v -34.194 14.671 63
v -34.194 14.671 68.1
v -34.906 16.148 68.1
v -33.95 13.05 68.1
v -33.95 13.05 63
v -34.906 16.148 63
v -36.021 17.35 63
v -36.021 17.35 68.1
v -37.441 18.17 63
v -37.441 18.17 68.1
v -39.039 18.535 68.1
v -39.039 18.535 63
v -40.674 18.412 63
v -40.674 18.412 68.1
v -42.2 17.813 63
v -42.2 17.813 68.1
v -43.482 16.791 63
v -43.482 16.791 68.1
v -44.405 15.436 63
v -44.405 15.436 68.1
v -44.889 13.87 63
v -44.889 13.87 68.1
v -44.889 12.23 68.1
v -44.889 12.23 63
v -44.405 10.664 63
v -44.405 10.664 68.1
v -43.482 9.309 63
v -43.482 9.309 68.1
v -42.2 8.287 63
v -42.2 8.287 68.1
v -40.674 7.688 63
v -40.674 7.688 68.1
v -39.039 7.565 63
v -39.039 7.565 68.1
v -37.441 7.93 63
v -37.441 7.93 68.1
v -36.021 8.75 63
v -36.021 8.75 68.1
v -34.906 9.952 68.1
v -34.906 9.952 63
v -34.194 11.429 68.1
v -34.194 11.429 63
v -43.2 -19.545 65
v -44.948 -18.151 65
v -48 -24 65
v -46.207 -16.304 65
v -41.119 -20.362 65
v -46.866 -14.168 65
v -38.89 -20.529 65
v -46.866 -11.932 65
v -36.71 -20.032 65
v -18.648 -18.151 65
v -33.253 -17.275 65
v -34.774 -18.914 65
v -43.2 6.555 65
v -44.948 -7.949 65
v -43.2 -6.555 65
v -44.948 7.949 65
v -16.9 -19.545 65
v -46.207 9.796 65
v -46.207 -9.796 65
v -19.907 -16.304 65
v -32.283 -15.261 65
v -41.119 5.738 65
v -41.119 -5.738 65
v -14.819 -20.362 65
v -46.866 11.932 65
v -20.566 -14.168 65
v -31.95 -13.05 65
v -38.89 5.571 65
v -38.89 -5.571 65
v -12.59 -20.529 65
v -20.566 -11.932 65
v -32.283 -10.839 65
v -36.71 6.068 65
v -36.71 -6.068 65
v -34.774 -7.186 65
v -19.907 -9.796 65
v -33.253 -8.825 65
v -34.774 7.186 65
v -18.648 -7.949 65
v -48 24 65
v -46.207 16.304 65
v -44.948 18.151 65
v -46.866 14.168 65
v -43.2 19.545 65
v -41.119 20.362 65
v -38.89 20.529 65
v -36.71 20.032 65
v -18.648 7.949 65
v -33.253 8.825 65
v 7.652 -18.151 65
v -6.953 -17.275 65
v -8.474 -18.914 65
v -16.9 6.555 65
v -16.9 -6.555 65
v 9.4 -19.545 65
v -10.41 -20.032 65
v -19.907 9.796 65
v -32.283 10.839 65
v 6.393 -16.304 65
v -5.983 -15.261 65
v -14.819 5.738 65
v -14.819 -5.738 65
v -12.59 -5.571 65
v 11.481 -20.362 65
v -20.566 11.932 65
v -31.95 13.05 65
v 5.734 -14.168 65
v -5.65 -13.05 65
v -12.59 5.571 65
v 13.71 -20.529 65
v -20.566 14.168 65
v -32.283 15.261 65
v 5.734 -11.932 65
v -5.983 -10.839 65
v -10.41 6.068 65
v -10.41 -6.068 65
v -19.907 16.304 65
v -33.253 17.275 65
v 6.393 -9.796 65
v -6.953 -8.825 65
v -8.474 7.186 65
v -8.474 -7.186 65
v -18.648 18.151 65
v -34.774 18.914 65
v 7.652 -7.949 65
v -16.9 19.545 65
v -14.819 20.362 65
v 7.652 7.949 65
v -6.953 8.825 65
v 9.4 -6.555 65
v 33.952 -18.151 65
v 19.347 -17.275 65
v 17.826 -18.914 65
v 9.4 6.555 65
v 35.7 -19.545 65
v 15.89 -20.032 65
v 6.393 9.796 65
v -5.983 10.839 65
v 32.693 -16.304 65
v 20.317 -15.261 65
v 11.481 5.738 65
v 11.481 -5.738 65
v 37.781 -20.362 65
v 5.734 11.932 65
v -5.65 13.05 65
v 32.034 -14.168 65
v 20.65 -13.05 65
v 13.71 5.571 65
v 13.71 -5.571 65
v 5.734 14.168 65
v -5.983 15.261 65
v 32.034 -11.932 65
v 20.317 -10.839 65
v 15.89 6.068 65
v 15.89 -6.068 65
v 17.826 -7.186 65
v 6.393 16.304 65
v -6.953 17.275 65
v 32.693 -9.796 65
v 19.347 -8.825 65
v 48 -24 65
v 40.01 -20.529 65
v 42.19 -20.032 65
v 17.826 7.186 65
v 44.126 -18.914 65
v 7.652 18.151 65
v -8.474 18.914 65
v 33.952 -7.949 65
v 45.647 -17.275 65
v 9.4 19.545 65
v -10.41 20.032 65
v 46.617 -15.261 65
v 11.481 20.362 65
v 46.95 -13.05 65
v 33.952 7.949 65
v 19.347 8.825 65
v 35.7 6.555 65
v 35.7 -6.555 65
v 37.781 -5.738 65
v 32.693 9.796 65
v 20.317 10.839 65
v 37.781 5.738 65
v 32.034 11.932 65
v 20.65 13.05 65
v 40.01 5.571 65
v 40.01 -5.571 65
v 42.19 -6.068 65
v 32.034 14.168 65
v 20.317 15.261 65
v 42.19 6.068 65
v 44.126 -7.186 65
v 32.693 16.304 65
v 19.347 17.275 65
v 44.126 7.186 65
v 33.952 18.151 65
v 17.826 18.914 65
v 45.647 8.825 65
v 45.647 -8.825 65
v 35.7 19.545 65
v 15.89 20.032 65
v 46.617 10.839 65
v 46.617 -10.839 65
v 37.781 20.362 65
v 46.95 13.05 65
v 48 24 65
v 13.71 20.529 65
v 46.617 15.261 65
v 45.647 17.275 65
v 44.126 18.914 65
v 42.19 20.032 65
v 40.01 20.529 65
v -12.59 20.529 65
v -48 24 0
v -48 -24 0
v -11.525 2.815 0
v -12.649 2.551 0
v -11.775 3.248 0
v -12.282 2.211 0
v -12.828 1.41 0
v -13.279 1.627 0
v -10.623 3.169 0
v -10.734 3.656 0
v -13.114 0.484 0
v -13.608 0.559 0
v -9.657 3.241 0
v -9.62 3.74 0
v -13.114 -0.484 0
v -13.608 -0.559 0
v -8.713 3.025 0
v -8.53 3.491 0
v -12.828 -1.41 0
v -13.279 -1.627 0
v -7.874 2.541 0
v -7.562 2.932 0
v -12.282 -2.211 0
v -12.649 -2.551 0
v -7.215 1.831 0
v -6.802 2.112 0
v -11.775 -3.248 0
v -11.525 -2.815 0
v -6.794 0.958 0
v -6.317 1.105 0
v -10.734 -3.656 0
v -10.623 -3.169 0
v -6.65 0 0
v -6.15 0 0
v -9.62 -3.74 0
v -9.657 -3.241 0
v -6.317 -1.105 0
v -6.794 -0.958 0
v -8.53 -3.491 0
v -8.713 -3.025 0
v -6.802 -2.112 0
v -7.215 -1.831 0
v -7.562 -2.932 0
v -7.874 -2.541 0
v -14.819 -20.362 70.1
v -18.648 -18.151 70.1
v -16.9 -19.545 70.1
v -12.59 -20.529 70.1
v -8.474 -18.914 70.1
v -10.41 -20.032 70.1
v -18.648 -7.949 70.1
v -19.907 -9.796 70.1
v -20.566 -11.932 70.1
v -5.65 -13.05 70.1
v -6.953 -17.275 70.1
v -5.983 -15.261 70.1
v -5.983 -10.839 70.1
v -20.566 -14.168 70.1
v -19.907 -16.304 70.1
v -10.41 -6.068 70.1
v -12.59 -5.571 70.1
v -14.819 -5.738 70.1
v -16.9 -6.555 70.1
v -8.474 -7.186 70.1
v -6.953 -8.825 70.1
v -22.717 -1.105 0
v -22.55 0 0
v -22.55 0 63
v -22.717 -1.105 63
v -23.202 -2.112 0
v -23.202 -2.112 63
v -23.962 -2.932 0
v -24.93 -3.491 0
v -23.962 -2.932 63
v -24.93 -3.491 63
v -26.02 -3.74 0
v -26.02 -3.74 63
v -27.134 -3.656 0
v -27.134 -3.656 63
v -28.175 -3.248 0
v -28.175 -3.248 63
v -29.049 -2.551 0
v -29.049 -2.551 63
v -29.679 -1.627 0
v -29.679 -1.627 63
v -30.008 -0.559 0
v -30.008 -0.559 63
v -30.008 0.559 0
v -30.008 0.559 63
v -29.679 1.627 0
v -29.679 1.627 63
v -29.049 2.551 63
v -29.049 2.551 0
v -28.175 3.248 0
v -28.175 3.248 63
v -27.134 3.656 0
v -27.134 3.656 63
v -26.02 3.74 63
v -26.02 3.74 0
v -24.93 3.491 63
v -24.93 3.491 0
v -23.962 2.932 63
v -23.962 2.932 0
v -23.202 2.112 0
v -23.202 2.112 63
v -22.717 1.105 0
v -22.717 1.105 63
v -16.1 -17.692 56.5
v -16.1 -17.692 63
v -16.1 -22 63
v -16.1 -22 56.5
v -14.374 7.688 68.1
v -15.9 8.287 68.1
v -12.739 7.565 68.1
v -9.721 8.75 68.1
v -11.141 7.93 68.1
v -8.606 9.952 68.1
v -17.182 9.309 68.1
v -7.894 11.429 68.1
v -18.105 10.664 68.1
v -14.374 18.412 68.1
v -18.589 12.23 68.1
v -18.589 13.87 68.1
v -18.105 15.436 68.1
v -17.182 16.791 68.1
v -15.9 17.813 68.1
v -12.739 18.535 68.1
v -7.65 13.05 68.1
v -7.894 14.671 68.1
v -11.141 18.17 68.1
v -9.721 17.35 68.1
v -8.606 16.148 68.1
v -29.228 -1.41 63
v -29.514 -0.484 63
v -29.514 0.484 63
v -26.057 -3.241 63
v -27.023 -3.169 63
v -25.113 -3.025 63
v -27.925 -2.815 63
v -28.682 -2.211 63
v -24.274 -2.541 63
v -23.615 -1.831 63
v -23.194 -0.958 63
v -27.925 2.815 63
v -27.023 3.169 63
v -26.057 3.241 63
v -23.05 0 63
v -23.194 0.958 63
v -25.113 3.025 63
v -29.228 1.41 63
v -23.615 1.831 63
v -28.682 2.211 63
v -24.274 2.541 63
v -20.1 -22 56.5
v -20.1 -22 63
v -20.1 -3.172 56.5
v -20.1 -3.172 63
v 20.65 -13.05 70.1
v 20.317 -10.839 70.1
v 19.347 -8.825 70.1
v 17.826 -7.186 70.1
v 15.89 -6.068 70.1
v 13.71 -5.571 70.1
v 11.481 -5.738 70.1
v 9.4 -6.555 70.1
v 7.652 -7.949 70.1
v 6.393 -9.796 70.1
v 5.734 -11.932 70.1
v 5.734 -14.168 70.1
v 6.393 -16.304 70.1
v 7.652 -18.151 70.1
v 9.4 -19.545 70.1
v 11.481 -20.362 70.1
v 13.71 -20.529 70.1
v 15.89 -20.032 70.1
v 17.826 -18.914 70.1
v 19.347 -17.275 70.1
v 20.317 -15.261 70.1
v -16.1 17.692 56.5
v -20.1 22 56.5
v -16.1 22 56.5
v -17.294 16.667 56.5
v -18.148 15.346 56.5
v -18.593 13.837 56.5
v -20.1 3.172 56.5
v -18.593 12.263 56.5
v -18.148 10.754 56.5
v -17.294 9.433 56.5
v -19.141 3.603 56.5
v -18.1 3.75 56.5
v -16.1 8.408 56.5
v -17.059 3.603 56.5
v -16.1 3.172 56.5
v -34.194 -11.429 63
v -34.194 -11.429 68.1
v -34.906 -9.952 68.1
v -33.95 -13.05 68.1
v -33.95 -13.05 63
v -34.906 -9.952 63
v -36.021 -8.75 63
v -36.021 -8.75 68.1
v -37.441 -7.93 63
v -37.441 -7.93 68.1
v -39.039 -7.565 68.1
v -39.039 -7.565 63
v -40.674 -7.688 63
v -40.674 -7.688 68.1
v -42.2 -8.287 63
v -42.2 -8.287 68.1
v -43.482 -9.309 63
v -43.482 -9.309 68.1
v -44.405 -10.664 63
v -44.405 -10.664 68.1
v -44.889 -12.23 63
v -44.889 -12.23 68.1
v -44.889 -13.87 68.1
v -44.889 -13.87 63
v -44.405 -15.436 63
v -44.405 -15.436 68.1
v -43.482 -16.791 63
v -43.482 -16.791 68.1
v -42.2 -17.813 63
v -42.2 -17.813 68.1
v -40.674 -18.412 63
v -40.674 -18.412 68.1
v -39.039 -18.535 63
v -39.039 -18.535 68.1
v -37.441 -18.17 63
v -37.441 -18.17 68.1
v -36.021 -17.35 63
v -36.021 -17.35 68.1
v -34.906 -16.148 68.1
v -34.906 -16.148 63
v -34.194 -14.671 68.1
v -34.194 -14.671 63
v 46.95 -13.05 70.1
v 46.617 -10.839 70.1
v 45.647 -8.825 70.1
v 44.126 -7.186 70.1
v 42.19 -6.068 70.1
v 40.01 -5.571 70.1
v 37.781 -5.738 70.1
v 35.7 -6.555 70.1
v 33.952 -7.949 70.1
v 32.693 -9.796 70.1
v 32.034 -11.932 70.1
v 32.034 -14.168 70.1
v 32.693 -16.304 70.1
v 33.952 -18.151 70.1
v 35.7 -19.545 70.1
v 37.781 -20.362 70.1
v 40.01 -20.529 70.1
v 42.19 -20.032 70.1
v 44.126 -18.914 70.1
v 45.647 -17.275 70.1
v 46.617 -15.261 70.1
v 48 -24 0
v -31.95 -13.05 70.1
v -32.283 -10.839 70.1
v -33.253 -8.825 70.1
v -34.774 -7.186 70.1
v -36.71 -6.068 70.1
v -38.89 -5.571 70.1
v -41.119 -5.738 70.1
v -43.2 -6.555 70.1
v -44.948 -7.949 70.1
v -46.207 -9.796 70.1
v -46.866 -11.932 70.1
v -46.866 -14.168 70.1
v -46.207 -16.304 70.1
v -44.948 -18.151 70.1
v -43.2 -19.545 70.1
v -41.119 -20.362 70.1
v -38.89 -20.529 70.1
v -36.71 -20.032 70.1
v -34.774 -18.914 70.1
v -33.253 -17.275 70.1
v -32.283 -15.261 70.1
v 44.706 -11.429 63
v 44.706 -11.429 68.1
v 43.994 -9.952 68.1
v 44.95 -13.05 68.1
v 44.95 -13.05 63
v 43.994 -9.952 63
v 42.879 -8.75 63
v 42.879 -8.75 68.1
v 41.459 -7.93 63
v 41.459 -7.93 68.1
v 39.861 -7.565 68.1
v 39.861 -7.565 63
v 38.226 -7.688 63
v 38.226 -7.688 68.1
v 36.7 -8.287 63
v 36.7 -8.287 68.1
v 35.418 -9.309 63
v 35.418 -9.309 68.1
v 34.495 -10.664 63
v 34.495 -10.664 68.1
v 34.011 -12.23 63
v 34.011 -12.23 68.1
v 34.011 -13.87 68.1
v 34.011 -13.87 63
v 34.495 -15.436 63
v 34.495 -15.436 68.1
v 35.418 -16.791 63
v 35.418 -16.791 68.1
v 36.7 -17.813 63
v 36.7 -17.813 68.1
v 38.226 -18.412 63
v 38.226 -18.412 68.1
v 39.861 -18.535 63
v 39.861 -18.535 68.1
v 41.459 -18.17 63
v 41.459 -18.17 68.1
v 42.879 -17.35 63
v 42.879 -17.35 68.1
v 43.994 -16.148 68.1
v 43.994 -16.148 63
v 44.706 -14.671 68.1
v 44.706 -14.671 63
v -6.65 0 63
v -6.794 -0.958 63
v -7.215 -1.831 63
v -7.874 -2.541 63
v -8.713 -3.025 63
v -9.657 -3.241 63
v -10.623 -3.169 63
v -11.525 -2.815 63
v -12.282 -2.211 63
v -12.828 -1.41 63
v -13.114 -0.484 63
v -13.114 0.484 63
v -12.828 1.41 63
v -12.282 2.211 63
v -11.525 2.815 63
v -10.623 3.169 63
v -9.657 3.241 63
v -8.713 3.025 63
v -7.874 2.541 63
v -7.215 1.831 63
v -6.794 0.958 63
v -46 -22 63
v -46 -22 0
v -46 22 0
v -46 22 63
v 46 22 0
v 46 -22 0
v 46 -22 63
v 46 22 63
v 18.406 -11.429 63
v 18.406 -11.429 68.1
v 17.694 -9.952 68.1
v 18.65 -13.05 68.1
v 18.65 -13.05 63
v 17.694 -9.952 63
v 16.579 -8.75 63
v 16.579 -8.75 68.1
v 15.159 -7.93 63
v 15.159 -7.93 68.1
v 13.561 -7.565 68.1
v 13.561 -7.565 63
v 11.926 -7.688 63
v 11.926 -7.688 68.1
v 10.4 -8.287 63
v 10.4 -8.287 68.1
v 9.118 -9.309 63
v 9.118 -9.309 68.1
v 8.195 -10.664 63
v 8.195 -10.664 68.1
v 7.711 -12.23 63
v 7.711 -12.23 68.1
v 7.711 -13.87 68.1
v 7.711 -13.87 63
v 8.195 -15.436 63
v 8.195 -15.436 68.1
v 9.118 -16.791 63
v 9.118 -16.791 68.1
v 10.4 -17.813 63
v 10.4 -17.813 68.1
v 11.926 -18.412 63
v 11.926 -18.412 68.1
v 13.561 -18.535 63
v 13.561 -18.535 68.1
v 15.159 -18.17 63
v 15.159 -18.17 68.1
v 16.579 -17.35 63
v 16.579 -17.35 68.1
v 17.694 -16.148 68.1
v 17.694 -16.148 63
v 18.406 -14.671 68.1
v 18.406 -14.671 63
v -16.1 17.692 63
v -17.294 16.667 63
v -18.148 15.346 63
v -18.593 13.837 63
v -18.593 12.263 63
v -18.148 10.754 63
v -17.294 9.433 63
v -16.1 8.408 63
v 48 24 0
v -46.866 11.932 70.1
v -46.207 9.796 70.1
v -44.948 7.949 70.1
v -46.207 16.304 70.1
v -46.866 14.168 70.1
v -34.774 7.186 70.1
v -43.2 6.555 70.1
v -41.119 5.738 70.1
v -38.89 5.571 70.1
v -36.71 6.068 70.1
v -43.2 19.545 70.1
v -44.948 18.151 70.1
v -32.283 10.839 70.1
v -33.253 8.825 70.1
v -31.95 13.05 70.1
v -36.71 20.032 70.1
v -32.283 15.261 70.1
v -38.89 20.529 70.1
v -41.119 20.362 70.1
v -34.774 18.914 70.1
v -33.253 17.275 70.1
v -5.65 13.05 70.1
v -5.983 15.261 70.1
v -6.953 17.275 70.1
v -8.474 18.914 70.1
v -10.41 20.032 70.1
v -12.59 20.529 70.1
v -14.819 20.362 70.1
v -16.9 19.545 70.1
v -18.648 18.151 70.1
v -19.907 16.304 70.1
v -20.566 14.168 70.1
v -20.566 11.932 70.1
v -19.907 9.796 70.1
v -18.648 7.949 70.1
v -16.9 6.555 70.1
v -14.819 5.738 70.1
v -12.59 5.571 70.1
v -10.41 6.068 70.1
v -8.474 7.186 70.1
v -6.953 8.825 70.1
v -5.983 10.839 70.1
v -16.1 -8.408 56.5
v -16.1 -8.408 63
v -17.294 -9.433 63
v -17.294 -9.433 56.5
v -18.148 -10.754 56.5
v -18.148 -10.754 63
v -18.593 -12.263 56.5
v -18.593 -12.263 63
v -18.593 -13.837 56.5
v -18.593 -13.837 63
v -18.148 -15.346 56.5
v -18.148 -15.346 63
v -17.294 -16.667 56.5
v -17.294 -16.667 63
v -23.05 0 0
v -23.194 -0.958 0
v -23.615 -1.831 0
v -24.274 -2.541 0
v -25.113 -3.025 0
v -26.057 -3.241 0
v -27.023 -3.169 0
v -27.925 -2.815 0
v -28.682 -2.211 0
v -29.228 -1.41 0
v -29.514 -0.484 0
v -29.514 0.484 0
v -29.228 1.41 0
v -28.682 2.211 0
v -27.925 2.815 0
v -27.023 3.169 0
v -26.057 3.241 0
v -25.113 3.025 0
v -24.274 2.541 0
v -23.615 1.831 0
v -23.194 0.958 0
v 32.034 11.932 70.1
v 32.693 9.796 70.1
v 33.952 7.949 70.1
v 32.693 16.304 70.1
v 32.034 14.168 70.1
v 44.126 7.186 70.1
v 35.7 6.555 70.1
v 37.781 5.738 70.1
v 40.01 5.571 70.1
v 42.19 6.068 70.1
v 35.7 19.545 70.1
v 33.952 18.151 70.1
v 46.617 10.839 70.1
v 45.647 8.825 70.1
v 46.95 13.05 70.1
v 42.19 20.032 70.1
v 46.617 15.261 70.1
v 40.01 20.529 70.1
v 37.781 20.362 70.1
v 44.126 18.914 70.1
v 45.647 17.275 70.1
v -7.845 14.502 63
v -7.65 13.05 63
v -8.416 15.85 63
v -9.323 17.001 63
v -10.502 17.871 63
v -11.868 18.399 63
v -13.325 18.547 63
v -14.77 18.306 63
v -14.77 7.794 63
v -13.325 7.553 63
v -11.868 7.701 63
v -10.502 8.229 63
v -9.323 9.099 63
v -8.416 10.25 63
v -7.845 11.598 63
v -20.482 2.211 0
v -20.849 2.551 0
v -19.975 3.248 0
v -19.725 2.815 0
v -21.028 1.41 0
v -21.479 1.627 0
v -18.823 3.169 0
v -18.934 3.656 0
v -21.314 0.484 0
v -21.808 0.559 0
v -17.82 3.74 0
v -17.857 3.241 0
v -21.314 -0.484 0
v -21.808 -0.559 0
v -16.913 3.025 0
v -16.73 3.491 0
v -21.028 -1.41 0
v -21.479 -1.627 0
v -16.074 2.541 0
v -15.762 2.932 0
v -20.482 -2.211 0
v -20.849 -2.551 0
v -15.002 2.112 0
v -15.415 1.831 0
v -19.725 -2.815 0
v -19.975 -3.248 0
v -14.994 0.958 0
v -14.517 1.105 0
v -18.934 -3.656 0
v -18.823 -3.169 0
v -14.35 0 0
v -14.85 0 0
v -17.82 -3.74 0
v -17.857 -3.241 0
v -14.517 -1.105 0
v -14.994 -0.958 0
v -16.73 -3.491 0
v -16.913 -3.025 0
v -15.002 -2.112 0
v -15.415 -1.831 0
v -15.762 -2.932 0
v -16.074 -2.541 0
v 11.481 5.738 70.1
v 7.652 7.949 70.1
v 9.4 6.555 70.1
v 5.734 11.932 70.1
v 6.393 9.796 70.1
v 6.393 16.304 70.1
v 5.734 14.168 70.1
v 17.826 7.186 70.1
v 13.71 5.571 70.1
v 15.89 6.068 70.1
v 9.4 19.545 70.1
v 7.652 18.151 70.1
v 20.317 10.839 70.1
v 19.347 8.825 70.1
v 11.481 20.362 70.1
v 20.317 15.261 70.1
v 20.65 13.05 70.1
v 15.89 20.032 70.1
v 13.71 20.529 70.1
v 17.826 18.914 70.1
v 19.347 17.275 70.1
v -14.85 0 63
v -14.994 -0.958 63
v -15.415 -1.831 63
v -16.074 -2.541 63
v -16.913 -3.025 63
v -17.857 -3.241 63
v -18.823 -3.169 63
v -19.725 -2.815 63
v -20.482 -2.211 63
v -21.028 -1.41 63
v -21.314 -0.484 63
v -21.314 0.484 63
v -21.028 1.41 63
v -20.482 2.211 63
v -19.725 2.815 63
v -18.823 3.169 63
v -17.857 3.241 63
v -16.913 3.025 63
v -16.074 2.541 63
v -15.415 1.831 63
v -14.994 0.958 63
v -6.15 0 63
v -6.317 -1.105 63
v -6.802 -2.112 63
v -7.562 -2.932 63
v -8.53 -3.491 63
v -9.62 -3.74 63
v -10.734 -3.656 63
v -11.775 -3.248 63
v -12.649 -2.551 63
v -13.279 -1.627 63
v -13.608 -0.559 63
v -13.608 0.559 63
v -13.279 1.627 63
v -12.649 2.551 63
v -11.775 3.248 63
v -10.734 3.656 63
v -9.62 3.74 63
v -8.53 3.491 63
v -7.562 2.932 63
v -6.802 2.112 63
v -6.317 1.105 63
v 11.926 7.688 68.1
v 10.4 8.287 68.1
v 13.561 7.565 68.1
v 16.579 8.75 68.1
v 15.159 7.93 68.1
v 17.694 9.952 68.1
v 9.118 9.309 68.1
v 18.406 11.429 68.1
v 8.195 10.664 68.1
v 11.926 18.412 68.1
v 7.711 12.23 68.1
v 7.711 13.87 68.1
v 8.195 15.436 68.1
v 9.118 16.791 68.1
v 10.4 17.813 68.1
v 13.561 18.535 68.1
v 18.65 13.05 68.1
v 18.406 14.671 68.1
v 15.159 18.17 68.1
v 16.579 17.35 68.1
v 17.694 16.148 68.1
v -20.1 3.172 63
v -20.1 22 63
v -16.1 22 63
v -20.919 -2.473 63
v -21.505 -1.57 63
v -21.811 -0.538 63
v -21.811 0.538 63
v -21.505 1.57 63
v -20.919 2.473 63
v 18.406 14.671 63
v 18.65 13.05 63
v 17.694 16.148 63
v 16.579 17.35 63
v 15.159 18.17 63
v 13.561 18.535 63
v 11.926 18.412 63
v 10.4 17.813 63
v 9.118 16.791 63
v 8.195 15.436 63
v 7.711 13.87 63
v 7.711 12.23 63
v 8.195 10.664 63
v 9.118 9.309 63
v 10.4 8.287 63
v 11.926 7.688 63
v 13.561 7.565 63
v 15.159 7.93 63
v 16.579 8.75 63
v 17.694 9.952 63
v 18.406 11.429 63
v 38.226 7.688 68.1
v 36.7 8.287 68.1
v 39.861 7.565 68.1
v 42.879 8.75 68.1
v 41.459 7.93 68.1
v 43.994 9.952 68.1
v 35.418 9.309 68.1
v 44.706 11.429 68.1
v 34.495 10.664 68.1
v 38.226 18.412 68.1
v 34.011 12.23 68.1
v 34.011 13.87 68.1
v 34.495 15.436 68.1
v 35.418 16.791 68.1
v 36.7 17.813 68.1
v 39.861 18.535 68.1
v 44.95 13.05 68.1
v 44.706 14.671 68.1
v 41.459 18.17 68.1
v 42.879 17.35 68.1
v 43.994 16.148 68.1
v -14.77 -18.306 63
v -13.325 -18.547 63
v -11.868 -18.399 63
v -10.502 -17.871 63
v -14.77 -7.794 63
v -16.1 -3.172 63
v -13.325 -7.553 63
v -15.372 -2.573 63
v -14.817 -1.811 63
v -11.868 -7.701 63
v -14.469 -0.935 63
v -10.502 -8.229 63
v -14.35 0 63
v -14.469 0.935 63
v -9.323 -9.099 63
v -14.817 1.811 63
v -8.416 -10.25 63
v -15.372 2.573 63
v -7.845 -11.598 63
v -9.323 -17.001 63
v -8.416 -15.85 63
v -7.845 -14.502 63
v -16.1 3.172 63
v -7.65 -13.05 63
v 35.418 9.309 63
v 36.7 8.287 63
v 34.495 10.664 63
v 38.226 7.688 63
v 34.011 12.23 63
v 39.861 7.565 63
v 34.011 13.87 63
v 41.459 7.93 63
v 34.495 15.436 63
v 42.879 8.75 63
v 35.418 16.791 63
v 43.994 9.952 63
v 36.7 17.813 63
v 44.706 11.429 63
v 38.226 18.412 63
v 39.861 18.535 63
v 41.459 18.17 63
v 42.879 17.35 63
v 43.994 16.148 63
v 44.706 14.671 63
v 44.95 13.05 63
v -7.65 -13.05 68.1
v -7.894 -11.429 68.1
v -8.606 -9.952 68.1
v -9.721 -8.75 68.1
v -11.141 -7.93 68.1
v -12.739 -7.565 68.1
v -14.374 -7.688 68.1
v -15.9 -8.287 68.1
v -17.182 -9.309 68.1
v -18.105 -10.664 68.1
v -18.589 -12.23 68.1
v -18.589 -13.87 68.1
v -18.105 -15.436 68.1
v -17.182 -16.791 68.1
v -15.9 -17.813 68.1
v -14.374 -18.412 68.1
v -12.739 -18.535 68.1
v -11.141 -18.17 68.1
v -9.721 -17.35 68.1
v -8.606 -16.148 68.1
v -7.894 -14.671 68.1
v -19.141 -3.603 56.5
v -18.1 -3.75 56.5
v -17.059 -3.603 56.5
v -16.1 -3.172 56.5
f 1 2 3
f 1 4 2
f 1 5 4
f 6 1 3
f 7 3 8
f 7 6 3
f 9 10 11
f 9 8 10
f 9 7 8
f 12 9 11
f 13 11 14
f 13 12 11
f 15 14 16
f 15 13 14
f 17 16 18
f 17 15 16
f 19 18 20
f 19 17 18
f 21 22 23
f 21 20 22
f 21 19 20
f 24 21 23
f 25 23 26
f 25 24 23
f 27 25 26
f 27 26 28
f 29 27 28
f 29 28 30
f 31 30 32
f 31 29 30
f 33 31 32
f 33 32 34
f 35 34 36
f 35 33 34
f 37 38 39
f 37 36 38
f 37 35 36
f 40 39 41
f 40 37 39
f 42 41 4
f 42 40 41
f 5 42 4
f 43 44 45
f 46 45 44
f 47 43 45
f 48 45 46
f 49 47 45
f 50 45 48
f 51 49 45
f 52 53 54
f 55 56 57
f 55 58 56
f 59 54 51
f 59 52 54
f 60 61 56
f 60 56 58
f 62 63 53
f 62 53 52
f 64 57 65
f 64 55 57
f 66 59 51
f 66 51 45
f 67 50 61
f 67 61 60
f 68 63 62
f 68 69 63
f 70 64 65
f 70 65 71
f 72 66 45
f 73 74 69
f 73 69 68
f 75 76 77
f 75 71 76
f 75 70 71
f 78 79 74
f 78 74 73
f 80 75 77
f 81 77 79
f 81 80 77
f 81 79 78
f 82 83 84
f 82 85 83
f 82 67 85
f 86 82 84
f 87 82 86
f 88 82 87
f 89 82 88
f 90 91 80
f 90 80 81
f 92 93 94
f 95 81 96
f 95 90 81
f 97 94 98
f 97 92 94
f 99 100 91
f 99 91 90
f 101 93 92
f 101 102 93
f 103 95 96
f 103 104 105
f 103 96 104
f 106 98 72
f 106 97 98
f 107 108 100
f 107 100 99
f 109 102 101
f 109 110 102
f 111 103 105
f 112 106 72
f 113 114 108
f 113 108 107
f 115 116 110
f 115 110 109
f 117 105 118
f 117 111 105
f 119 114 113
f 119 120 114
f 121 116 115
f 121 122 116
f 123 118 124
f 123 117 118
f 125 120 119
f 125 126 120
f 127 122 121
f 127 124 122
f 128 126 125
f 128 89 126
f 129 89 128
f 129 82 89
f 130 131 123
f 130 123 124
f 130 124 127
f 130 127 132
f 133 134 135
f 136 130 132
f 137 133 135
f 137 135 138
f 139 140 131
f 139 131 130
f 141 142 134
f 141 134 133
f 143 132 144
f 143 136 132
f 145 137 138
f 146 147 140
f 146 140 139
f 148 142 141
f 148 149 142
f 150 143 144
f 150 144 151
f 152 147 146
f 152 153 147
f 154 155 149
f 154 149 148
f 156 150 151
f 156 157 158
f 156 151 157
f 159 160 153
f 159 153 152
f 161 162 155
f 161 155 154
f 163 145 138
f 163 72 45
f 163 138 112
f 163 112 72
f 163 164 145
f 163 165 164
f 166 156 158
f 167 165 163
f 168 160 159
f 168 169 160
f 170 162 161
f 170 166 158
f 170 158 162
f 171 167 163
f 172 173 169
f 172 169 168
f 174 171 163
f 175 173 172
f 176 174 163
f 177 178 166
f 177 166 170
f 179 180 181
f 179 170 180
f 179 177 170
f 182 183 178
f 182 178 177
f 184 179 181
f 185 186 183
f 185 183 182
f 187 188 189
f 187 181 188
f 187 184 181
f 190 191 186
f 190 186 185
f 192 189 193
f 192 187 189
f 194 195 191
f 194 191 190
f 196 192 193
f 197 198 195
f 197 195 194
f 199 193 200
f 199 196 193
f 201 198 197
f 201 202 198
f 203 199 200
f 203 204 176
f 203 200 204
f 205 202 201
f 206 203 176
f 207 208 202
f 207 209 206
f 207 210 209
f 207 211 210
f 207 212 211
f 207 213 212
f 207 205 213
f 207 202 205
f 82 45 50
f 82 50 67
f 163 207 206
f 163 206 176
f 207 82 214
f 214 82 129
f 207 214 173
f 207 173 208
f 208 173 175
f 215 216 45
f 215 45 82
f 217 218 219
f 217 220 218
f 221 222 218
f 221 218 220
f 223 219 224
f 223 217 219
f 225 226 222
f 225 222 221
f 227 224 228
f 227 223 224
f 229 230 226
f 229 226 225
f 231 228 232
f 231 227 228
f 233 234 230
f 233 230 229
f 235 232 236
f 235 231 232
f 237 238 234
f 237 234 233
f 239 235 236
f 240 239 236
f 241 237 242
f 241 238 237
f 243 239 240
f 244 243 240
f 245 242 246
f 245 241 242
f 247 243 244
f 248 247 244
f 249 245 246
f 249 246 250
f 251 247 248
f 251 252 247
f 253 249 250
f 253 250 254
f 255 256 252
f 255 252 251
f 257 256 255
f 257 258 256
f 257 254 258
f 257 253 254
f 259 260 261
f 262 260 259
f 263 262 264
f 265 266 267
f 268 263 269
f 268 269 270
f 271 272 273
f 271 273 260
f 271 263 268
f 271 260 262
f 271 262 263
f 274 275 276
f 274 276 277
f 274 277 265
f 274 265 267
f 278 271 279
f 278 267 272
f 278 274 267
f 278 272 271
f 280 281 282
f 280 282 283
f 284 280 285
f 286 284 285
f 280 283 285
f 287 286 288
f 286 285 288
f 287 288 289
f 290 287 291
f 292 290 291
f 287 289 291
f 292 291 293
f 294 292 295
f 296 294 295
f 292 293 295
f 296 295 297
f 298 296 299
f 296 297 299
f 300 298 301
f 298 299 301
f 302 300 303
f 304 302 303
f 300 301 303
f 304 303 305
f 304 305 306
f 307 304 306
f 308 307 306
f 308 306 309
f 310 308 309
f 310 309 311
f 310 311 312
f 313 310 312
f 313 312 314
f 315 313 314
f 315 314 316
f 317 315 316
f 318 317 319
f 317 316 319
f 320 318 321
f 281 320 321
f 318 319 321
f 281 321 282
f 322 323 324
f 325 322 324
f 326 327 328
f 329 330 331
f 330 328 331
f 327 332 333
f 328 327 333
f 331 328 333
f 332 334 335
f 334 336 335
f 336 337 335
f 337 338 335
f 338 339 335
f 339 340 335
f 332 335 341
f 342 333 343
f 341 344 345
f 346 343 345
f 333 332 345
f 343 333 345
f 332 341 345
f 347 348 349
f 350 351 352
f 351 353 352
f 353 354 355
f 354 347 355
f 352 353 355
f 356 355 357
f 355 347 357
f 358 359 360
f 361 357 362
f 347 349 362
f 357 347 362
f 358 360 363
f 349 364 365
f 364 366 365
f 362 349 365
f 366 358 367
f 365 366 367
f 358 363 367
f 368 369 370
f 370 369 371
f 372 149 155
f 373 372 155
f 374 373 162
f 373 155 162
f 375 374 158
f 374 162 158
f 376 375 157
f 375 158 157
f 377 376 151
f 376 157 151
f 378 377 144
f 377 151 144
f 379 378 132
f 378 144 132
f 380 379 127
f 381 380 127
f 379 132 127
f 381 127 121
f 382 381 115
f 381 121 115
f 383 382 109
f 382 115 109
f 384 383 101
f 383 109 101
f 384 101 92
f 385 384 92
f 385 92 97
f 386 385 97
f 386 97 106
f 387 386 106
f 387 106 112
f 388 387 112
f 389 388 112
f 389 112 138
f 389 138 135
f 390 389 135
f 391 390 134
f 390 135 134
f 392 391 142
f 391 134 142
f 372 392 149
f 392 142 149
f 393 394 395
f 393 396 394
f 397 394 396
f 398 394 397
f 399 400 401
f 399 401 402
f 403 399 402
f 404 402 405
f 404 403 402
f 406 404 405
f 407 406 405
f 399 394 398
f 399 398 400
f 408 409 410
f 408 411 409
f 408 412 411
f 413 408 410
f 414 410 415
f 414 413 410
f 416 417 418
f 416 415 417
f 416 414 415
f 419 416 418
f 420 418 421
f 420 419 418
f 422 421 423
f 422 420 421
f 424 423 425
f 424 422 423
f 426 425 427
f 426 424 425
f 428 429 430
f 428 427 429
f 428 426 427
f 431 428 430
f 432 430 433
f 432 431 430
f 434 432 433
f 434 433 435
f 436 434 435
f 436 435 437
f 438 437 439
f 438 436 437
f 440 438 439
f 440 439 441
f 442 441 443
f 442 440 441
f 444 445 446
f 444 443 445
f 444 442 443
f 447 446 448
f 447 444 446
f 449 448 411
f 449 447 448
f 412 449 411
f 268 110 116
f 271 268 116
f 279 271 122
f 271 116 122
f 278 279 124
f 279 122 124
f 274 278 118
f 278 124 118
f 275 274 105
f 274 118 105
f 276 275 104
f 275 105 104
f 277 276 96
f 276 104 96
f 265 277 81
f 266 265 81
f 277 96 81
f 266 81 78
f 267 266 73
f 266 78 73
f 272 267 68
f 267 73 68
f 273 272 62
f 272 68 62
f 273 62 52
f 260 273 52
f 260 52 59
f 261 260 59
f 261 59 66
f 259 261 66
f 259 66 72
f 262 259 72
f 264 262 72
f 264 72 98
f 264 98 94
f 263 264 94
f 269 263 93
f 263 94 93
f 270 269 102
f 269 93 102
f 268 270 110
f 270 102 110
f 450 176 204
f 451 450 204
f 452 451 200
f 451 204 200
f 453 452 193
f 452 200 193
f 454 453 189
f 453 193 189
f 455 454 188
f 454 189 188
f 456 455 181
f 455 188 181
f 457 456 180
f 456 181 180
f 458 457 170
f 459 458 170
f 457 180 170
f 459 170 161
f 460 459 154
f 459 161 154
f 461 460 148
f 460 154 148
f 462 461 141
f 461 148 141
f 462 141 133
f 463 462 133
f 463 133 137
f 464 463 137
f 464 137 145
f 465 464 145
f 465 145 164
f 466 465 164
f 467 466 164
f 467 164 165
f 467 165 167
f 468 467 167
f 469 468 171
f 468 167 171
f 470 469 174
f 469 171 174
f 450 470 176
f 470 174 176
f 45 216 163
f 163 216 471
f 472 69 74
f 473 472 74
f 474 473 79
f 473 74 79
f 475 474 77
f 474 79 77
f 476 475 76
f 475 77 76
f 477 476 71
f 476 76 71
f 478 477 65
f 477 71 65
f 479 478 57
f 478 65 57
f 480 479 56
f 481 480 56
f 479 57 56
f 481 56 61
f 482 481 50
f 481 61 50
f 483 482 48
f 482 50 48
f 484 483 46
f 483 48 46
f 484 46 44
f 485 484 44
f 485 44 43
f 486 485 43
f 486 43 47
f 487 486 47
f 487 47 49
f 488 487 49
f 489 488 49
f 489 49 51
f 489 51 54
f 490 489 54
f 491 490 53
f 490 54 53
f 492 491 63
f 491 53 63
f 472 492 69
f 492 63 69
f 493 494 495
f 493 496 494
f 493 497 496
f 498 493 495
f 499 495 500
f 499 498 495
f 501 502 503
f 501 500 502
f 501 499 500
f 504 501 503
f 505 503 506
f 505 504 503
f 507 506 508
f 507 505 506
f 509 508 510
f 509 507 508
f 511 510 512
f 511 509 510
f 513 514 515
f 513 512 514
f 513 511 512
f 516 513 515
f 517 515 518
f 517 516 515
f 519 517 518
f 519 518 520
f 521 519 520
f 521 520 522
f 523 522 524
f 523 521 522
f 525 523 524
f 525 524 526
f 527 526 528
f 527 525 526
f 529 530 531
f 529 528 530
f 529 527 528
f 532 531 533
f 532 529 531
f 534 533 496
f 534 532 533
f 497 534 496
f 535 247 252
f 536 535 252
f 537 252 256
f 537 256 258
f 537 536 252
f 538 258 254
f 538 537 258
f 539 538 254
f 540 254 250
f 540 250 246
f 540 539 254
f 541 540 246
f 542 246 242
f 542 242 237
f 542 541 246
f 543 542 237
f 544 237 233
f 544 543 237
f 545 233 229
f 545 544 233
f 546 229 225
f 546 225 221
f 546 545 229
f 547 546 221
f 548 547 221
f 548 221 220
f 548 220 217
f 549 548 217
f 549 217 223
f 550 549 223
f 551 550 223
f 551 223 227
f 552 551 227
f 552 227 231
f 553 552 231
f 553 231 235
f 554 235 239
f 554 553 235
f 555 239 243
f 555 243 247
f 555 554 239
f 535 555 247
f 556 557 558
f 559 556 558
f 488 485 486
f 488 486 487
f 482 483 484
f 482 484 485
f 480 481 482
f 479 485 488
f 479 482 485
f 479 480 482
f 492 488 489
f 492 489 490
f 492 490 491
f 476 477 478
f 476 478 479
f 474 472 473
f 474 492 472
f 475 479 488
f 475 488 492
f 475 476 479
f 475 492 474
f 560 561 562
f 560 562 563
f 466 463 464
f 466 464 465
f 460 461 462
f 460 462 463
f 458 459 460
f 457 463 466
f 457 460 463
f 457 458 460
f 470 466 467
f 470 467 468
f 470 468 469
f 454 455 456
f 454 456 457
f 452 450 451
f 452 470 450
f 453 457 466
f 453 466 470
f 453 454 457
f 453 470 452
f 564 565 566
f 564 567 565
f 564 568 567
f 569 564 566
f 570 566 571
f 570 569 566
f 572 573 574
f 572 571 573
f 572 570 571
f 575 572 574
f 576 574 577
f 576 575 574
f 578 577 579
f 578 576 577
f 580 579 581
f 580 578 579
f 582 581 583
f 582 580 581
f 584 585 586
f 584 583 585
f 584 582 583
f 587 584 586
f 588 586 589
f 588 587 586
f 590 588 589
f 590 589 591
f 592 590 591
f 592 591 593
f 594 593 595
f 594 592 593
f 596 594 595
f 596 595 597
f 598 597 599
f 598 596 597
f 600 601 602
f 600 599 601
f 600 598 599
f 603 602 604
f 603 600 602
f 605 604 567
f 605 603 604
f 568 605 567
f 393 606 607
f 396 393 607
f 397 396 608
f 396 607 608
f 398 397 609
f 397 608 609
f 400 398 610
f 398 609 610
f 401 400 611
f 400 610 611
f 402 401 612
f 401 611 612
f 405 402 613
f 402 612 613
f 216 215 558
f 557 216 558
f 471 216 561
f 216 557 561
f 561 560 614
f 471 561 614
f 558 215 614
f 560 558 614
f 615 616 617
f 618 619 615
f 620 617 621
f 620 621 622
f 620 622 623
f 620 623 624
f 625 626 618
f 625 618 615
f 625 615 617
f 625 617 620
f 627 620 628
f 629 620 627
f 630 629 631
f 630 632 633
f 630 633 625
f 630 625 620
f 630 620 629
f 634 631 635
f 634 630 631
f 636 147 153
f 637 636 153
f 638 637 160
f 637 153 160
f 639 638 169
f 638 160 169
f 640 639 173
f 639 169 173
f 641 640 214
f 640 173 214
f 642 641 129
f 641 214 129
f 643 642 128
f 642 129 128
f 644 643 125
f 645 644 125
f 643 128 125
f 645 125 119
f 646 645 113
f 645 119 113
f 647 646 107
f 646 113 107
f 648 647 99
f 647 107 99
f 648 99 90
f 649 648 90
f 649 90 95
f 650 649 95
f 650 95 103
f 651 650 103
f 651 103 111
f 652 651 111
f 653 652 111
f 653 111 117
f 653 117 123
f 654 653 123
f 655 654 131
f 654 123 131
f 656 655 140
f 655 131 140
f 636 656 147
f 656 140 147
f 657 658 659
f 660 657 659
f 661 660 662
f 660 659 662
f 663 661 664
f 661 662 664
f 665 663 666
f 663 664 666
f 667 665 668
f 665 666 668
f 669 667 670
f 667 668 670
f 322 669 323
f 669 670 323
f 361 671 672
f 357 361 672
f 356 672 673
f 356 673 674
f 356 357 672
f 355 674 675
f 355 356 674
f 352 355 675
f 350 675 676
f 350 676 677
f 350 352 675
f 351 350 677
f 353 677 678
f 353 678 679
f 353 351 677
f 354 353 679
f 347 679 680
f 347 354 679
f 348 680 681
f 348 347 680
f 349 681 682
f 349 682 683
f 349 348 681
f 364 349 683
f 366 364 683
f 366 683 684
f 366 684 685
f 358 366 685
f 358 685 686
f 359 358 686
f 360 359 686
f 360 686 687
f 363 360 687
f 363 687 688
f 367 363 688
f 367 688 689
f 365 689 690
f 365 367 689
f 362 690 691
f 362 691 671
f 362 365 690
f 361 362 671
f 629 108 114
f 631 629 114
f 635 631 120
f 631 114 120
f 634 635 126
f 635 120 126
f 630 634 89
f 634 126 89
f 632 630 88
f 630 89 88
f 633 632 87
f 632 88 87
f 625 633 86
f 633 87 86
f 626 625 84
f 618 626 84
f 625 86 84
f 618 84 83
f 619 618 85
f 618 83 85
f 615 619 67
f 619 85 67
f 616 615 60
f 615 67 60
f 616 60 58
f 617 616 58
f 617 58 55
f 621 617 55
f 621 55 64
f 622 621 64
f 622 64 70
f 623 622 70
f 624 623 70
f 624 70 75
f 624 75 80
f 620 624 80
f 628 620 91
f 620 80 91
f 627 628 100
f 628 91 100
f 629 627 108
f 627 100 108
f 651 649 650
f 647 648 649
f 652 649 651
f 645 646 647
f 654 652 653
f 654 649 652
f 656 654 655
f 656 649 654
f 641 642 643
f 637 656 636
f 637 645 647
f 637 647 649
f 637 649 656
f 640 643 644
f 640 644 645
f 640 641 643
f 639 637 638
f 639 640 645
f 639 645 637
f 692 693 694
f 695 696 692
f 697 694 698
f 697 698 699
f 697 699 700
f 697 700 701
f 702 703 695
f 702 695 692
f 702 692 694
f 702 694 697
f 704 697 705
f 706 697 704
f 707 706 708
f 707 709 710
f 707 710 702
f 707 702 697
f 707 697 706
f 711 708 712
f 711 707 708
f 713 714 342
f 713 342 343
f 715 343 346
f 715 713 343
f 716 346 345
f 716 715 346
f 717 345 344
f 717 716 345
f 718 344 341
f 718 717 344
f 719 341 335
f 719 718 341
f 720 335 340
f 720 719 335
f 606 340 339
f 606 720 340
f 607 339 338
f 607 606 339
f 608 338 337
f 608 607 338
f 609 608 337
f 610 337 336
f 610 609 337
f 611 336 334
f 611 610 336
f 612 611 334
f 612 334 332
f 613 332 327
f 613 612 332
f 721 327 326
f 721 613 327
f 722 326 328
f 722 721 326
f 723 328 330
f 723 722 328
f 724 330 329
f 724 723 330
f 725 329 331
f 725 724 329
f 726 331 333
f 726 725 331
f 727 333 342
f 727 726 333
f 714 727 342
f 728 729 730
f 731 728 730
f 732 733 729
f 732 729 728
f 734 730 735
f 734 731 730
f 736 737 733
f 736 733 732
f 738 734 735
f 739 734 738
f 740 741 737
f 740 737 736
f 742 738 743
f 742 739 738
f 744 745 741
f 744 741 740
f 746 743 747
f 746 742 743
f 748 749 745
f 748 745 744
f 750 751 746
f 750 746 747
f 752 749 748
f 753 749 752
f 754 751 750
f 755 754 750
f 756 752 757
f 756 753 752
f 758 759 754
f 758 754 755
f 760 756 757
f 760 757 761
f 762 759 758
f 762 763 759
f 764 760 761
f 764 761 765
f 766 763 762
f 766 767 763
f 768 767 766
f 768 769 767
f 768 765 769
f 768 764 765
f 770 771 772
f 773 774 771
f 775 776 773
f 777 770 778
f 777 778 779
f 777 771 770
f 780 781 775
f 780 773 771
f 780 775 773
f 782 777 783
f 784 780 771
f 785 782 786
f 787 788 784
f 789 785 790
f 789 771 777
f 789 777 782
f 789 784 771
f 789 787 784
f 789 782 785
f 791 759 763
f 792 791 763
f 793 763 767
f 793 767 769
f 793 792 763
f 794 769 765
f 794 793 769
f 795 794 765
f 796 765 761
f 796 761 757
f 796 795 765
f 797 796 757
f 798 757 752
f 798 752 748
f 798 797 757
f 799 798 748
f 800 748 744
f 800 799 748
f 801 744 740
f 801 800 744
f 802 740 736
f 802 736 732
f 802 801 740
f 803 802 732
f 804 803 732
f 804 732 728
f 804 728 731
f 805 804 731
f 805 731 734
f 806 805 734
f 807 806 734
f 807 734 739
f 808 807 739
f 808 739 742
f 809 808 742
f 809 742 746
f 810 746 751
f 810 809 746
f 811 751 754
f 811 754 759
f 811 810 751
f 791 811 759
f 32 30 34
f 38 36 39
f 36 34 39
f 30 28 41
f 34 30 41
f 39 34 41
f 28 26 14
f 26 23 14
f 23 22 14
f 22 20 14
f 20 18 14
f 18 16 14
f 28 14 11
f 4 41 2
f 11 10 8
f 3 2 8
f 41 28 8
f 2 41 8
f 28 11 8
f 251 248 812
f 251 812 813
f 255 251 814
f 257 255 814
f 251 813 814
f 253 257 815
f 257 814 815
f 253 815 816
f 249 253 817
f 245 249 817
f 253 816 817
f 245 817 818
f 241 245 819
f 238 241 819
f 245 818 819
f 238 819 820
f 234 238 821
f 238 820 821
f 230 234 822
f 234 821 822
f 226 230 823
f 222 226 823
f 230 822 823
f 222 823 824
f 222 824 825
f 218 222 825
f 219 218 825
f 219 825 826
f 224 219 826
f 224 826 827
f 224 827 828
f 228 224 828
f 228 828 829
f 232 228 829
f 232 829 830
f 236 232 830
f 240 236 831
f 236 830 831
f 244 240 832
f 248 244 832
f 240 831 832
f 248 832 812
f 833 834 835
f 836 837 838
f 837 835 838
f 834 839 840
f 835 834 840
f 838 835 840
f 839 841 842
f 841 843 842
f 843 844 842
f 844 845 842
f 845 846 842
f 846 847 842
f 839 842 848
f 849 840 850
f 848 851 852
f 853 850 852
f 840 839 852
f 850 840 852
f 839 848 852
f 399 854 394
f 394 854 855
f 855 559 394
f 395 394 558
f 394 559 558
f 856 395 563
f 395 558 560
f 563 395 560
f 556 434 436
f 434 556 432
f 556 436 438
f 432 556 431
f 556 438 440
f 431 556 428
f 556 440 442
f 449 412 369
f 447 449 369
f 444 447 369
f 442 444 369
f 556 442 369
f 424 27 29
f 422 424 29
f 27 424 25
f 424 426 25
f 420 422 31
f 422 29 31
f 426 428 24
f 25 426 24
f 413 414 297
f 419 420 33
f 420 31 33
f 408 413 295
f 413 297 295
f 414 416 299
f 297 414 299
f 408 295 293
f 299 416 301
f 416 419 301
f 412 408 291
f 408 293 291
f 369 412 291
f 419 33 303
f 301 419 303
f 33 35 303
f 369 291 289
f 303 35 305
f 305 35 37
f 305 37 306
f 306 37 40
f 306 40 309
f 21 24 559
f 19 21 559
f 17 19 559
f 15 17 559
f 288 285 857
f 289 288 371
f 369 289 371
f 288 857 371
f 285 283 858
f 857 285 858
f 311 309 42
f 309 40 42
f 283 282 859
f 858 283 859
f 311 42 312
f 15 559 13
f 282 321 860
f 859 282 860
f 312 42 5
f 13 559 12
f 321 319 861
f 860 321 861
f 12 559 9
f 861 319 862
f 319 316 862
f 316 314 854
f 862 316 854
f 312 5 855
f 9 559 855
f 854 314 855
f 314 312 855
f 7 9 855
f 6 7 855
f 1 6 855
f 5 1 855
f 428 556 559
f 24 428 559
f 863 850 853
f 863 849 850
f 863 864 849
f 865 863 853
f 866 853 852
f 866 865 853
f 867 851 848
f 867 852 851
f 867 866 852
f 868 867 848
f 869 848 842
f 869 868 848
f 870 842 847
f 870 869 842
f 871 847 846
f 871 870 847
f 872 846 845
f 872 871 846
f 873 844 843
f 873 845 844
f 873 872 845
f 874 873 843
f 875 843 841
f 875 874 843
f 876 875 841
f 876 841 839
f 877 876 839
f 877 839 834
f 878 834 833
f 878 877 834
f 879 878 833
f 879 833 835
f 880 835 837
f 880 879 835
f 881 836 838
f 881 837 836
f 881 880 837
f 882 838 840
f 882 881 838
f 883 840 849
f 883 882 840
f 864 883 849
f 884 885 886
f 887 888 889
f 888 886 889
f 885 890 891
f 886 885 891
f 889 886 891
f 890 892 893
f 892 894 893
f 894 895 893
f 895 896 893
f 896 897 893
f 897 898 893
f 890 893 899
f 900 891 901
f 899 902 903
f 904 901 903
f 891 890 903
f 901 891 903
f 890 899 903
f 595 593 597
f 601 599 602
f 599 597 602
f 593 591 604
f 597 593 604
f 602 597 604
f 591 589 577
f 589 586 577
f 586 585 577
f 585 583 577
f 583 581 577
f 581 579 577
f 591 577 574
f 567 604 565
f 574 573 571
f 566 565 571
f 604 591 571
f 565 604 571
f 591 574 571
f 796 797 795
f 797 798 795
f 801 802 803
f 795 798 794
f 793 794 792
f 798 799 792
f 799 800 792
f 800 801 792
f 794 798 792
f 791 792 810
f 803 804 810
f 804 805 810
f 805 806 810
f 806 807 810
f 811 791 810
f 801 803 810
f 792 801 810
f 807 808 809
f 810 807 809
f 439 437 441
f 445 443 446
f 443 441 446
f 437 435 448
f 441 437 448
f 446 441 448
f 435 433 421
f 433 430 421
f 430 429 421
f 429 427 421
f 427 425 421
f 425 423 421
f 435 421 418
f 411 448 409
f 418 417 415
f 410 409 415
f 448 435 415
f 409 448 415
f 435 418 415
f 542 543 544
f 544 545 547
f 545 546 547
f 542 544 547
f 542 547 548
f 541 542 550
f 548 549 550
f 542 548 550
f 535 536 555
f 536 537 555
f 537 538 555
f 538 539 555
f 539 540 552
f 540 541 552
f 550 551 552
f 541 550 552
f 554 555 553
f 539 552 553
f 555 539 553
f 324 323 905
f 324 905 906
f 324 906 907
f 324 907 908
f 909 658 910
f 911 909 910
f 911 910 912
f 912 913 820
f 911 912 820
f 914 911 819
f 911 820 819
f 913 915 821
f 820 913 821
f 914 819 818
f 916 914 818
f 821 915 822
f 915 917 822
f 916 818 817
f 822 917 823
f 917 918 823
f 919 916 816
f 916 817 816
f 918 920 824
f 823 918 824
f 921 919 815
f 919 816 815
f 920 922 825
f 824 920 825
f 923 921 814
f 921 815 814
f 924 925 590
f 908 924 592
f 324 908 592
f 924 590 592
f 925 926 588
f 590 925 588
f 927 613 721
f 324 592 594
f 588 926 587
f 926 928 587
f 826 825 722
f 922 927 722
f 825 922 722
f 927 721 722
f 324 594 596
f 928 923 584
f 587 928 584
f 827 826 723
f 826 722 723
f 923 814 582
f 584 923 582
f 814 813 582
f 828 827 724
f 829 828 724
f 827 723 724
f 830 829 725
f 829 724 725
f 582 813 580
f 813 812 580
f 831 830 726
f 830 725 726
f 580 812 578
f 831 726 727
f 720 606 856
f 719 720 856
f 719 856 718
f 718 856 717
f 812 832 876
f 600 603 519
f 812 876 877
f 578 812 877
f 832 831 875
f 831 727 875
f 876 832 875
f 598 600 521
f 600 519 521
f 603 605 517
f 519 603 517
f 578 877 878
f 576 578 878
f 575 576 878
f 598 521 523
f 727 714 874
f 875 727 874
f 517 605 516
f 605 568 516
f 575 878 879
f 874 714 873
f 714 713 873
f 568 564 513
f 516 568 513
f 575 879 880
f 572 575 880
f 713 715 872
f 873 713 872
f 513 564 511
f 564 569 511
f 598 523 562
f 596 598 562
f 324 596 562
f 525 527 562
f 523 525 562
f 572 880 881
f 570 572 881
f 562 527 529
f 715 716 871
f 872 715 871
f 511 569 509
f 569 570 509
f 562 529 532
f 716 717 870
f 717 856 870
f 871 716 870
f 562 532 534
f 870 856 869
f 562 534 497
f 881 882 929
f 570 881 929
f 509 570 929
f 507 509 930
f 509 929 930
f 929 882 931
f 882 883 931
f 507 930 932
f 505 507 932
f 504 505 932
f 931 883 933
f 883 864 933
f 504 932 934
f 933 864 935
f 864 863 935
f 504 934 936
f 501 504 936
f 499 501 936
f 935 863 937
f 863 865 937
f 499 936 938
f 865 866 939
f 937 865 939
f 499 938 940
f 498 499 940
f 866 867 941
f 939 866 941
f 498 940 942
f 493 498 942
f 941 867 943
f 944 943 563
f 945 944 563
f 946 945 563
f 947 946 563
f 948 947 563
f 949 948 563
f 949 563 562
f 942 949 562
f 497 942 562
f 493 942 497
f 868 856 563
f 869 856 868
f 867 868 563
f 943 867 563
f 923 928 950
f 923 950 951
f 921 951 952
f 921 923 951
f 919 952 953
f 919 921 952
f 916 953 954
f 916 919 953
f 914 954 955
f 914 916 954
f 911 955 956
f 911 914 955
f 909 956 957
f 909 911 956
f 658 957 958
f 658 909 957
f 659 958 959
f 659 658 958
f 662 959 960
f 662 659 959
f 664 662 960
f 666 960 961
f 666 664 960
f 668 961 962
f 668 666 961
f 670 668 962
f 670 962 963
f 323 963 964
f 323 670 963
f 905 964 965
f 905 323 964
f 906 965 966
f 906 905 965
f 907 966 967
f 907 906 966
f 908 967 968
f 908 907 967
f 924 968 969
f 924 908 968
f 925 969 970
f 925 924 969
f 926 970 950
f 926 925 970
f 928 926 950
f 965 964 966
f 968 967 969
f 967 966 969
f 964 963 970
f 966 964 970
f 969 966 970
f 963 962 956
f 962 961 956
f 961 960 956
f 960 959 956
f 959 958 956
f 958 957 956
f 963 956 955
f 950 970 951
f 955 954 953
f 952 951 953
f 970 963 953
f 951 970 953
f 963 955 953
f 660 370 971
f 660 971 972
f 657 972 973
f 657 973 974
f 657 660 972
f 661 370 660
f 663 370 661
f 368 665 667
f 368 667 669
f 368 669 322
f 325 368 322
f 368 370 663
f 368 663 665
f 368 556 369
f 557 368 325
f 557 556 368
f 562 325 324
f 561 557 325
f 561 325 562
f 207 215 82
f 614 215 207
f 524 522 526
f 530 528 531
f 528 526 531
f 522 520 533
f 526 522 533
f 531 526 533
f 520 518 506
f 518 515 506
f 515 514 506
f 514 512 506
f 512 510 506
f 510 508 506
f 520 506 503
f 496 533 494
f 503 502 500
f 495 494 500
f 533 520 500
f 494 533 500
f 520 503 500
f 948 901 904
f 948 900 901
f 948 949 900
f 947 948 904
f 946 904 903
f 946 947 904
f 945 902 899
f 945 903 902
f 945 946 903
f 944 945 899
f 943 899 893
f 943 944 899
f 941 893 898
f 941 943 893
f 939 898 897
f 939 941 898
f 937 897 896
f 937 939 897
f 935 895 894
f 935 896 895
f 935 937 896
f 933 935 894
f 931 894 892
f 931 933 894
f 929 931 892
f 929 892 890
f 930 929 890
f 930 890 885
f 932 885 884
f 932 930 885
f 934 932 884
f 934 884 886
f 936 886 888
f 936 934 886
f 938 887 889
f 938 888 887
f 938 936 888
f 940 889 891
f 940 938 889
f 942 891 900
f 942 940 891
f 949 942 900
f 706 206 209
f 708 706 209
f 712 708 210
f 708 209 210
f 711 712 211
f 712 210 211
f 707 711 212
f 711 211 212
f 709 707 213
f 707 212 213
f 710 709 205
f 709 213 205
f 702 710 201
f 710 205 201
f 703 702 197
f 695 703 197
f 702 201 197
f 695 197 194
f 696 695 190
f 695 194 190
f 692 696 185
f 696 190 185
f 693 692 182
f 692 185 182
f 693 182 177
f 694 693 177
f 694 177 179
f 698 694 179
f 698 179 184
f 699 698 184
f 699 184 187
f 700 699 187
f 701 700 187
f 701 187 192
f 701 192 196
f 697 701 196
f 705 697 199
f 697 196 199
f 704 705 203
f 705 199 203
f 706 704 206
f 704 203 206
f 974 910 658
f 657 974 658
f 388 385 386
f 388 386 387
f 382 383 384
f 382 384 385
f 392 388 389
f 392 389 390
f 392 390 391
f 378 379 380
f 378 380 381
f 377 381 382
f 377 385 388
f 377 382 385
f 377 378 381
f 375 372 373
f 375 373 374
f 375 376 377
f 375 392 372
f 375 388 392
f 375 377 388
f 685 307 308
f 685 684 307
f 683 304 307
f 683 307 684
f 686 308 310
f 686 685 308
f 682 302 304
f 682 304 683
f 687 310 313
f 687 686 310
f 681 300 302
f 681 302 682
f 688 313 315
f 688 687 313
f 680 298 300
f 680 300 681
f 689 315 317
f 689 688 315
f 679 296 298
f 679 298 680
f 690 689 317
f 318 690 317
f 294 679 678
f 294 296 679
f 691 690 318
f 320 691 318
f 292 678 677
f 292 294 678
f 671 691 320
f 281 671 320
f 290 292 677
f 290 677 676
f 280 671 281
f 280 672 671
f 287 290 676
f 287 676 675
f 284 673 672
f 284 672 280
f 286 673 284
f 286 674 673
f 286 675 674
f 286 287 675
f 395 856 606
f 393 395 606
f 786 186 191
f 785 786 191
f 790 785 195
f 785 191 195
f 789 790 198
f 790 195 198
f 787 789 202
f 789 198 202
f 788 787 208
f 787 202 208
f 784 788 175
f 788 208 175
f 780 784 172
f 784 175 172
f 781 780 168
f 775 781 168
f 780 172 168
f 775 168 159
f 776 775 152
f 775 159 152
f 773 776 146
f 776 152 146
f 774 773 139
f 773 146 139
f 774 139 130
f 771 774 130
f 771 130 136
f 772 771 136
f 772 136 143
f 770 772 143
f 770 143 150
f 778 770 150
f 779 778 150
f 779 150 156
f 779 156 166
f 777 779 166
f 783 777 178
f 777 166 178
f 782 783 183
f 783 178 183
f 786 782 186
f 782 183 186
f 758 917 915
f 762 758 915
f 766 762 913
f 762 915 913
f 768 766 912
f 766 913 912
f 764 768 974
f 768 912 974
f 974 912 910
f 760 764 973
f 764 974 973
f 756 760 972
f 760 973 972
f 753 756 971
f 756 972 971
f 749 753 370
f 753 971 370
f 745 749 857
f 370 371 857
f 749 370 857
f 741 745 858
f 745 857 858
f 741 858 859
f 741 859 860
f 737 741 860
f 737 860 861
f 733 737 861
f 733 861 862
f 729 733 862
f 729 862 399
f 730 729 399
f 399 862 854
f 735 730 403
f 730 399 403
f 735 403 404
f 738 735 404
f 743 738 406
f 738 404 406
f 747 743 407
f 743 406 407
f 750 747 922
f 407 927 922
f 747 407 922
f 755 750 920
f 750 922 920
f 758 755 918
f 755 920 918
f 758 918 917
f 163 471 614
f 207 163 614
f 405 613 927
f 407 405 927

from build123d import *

# Parameters (mm, degrees)
F0_W     = 96
F0_H     = 48
F1_DEPTH = 65
F2_R     = 7.5
F3_DEPTH = 5.1
F4_T     = -2
F5_R     = 3.75
F5_R_2   = 3.25
F6_DEPTH = 63
F8_DEPTH = 6.5


# Not quite as in the source:
# - after a boolean that leaves OpenCascade's solid faulty, fix() repairs it


with BuildPart() as f1:
    # F0 (on Top) → F1 (new body)
    with BuildSketch(Plane.XY):
        Rectangle(F0_W, F0_H)
    extrude(amount=F1_DEPTH)

    # F2 (on face) → F3 (join)
    with BuildSketch(Plane.XY.offset(65)):
        with Locations((-39.45, 13.05)):
            Circle(F2_R)
        with Locations((-13.15, 13.05)):
            Circle(F2_R)
        with Locations((39.45, 13.05)):
            Circle(F2_R)
        with Locations((39.45, -13.05)):
            Circle(F2_R)
        with Locations((13.15, -13.05)):
            Circle(F2_R)
        with Locations((-13.15, -13.05)):
            Circle(F2_R)
        with Locations((-39.45, -13.05)):
            Circle(F2_R)
        with Locations((13.15, 13.05)):
            Circle(F2_R)
    extrude(amount=F3_DEPTH)

    # F4
    f4_openings = [f1.faces().sort_by_distance(p)[0] for p in [
        (0, 0, 0),
    ]]
    offset(amount=F4_T, openings=f4_openings, kind=Kind.INTERSECTION)

    # F5 (on face) → F6 (join, through all)
    with BuildSketch(Plane(origin=(0, 0, 63), x_dir=(1, 0, 0), z_dir=(0, 0, -1))):
        with Locations((-26.3, 0)):
            Circle(F5_R)
        with Locations((-26.3, 0)):
            Circle(F5_R_2, mode=Mode.SUBTRACT)
        with Locations((-18.1, 0)):
            Circle(F5_R)
        with Locations((-18.1, 0)):
            Circle(F5_R_2, mode=Mode.SUBTRACT)
        with Locations((-9.9, 0)):
            Circle(F5_R)
        with Locations((-9.9, 0)):
            Circle(F5_R_2, mode=Mode.SUBTRACT)
    extrude(amount=F6_DEPTH)

    # F7 (on face) → F8 (join)
    with BuildSketch(Plane(origin=(0, 0, 63), x_dir=(1, 0, 0), z_dir=(0, 0, -1))):
        with BuildLine():
            ThreePointArc((-20.1, 3.1721443851), (-18.1, 3.75), (-16.1, 3.1721443851))
            Line((-16.1, 3.1721443851), (-16.1, 8.4080715214))
            ThreePointArc((-16.1, 8.4080715214), (-18.65, 13.05), (-16.1, 17.6919284786))
            Line((-16.1, 17.6919284786), (-16.1, 22))
            Line((-16.1, 22), (-20.1, 22))
            Line((-20.1, 22), (-20.1, 3.1721443851))
        make_face()
        with BuildLine():
            Line((-16.1, -8.4080715214), (-16.1, -3.1721443851))
            ThreePointArc((-16.1, -3.1721443851), (-18.1, -3.75), (-20.1, -3.1721443851))
            Line((-20.1, -3.1721443851), (-20.1, -22))
            Line((-20.1, -22), (-16.1, -22))
            Line((-16.1, -22), (-16.1, -17.6919284786))
            ThreePointArc((-16.1, -17.6919284786), (-18.65, -13.05), (-16.1, -8.4080715214))
        make_face()
    extrude(amount=F8_DEPTH)

    add(f1.part.fix(), mode=Mode.REPLACE)


solid = f1.part
